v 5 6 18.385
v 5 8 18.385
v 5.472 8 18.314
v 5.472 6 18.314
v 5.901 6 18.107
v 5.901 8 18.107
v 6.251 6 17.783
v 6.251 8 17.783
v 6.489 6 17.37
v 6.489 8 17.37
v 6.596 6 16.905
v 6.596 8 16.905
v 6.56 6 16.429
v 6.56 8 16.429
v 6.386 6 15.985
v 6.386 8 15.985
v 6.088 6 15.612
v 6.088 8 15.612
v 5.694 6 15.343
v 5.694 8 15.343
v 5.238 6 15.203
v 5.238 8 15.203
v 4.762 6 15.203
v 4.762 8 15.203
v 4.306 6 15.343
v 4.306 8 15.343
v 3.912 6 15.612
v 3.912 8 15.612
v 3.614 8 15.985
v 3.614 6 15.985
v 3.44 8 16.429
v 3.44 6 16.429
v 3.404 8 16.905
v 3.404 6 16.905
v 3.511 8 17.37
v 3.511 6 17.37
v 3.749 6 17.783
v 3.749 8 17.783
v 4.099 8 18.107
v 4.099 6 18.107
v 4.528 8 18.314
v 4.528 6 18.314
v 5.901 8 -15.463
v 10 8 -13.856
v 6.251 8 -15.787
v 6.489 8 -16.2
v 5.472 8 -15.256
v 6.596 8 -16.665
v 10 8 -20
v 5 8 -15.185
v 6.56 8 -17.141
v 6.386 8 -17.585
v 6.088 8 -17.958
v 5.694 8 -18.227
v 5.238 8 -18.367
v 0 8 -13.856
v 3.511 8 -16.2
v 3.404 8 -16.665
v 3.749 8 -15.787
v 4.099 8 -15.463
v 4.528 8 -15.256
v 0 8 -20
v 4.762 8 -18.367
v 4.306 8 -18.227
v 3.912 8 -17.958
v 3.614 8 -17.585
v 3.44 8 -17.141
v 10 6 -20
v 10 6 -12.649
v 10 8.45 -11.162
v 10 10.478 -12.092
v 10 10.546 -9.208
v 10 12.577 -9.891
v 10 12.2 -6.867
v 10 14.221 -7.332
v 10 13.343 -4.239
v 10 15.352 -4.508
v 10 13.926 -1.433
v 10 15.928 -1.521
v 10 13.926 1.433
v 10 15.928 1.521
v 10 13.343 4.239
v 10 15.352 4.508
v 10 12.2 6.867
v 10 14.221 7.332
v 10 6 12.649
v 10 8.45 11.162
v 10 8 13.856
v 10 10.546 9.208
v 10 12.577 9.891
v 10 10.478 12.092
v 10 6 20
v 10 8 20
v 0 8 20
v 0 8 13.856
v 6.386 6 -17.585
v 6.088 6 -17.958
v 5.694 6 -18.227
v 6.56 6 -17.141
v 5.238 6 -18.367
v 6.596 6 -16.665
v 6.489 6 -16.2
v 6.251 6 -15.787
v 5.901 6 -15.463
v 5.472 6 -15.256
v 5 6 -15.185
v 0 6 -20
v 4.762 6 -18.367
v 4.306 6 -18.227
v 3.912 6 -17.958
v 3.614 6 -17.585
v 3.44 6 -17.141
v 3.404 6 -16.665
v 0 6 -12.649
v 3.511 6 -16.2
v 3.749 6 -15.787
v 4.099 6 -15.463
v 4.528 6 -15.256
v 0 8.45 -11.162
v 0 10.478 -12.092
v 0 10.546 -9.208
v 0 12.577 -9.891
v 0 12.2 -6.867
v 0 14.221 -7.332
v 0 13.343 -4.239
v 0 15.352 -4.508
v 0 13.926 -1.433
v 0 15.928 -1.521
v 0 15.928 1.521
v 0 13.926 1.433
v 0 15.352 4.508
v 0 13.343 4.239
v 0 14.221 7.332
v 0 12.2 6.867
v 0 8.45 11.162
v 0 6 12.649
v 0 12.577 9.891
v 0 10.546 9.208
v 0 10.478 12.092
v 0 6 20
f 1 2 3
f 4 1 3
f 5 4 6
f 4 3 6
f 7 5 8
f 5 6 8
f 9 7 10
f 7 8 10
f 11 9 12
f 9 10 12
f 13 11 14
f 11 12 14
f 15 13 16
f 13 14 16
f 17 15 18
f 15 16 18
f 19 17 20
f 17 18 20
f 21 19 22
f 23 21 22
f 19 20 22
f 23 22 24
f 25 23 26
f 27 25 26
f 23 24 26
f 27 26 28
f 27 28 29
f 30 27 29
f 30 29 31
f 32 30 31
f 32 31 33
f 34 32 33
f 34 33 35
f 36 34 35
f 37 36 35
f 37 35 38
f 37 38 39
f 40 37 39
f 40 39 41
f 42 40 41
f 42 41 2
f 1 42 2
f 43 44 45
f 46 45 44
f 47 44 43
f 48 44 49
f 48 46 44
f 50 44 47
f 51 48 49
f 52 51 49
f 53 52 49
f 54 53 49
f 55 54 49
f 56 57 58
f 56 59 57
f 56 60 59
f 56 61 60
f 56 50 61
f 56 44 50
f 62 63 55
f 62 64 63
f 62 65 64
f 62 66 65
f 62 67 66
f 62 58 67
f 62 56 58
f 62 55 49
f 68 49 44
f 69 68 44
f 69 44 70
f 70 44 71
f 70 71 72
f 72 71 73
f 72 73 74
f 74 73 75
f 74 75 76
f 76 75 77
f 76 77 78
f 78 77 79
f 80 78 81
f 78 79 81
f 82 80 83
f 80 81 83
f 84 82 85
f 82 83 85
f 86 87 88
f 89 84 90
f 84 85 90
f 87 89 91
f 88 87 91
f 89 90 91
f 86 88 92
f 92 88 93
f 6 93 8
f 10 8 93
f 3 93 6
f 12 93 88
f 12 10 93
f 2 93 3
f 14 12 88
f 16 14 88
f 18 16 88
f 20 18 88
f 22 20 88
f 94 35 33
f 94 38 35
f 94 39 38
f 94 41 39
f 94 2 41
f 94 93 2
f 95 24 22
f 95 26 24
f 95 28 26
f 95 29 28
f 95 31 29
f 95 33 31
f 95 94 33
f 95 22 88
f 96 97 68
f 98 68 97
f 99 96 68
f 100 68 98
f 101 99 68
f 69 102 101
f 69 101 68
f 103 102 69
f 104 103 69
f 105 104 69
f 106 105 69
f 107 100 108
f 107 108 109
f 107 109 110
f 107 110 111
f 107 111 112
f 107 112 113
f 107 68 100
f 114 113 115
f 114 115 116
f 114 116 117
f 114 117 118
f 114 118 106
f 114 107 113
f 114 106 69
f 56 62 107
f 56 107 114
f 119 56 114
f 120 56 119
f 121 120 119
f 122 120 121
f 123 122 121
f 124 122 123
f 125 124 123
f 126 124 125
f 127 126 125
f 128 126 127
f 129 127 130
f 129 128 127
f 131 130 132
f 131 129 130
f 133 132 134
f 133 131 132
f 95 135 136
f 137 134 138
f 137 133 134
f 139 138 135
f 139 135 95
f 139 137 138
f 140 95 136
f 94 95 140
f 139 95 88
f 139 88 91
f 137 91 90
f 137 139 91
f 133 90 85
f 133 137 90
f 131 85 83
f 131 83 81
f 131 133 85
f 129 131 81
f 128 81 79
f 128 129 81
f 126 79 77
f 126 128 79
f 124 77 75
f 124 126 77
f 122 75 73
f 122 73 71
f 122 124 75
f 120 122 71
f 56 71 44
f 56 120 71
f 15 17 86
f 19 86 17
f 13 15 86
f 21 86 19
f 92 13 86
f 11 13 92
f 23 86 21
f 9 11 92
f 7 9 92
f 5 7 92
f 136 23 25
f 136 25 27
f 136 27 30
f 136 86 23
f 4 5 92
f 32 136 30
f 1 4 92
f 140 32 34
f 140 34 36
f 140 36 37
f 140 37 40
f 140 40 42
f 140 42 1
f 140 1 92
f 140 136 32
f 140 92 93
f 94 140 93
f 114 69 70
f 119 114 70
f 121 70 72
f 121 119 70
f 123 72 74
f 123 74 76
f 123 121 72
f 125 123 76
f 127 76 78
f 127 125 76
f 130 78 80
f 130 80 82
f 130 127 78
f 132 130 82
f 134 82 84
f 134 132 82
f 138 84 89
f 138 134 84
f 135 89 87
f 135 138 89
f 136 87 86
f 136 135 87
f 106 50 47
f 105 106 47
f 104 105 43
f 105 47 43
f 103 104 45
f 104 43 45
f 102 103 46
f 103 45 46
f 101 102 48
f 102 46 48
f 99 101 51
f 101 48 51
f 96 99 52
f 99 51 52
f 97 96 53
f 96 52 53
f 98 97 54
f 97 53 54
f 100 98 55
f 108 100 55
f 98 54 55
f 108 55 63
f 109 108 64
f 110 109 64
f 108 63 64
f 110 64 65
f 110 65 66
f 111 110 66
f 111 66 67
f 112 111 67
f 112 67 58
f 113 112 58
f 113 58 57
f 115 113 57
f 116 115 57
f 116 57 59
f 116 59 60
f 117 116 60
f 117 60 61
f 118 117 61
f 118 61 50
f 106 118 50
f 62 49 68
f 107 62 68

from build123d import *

# Parameters (mm, degrees)
EXTRUDE_1_DEPTH     = 10
SKETCH_3_R          = 1.6
CUT_EXTRUDE_1_DEPTH = 10


with BuildPart() as part:
    # 草图2 → 凸台-拉伸1 (new body)
    with BuildSketch(Plane(origin=(0, 0, 0), x_dir=(0, 0, -1), z_dir=(1, 0, 0))):
        with BuildLine():
            Line((-12.649110641, 6), (-20, 6))
            Line((-20, 6), (-20, 8))
            Line((-20, 8), (-13.856406461, 8))
            ThreePointArc((-13.856406461, 8), (0, 16), (13.856406461, 8))
            Line((13.856406461, 8), (20, 8))
            Line((20, 8), (20, 6))
            Line((20, 6), (12.649110641, 6))
            ThreePointArc((12.649110641, 6), (0, 14), (-12.649110641, 6))
        make_face()
    extrude(amount=EXTRUDE_1_DEPTH)

    # 草图3 → 切除-拉伸1 (cut)
    with BuildSketch(Plane(origin=(0, 8, 0), x_dir=(1, 0, 0), z_dir=(0, 1, 0))):
        with Locations(Location((5, 16.785, 0), (0, 0, 270))):
            Circle(SKETCH_3_R)
        with Locations(Location((5, -16.785, 0), (0, 0, 270))):
            Circle(SKETCH_3_R)
    extrude(amount=-CUT_EXTRUDE_1_DEPTH, mode=Mode.SUBTRACT)


solid = part.part
